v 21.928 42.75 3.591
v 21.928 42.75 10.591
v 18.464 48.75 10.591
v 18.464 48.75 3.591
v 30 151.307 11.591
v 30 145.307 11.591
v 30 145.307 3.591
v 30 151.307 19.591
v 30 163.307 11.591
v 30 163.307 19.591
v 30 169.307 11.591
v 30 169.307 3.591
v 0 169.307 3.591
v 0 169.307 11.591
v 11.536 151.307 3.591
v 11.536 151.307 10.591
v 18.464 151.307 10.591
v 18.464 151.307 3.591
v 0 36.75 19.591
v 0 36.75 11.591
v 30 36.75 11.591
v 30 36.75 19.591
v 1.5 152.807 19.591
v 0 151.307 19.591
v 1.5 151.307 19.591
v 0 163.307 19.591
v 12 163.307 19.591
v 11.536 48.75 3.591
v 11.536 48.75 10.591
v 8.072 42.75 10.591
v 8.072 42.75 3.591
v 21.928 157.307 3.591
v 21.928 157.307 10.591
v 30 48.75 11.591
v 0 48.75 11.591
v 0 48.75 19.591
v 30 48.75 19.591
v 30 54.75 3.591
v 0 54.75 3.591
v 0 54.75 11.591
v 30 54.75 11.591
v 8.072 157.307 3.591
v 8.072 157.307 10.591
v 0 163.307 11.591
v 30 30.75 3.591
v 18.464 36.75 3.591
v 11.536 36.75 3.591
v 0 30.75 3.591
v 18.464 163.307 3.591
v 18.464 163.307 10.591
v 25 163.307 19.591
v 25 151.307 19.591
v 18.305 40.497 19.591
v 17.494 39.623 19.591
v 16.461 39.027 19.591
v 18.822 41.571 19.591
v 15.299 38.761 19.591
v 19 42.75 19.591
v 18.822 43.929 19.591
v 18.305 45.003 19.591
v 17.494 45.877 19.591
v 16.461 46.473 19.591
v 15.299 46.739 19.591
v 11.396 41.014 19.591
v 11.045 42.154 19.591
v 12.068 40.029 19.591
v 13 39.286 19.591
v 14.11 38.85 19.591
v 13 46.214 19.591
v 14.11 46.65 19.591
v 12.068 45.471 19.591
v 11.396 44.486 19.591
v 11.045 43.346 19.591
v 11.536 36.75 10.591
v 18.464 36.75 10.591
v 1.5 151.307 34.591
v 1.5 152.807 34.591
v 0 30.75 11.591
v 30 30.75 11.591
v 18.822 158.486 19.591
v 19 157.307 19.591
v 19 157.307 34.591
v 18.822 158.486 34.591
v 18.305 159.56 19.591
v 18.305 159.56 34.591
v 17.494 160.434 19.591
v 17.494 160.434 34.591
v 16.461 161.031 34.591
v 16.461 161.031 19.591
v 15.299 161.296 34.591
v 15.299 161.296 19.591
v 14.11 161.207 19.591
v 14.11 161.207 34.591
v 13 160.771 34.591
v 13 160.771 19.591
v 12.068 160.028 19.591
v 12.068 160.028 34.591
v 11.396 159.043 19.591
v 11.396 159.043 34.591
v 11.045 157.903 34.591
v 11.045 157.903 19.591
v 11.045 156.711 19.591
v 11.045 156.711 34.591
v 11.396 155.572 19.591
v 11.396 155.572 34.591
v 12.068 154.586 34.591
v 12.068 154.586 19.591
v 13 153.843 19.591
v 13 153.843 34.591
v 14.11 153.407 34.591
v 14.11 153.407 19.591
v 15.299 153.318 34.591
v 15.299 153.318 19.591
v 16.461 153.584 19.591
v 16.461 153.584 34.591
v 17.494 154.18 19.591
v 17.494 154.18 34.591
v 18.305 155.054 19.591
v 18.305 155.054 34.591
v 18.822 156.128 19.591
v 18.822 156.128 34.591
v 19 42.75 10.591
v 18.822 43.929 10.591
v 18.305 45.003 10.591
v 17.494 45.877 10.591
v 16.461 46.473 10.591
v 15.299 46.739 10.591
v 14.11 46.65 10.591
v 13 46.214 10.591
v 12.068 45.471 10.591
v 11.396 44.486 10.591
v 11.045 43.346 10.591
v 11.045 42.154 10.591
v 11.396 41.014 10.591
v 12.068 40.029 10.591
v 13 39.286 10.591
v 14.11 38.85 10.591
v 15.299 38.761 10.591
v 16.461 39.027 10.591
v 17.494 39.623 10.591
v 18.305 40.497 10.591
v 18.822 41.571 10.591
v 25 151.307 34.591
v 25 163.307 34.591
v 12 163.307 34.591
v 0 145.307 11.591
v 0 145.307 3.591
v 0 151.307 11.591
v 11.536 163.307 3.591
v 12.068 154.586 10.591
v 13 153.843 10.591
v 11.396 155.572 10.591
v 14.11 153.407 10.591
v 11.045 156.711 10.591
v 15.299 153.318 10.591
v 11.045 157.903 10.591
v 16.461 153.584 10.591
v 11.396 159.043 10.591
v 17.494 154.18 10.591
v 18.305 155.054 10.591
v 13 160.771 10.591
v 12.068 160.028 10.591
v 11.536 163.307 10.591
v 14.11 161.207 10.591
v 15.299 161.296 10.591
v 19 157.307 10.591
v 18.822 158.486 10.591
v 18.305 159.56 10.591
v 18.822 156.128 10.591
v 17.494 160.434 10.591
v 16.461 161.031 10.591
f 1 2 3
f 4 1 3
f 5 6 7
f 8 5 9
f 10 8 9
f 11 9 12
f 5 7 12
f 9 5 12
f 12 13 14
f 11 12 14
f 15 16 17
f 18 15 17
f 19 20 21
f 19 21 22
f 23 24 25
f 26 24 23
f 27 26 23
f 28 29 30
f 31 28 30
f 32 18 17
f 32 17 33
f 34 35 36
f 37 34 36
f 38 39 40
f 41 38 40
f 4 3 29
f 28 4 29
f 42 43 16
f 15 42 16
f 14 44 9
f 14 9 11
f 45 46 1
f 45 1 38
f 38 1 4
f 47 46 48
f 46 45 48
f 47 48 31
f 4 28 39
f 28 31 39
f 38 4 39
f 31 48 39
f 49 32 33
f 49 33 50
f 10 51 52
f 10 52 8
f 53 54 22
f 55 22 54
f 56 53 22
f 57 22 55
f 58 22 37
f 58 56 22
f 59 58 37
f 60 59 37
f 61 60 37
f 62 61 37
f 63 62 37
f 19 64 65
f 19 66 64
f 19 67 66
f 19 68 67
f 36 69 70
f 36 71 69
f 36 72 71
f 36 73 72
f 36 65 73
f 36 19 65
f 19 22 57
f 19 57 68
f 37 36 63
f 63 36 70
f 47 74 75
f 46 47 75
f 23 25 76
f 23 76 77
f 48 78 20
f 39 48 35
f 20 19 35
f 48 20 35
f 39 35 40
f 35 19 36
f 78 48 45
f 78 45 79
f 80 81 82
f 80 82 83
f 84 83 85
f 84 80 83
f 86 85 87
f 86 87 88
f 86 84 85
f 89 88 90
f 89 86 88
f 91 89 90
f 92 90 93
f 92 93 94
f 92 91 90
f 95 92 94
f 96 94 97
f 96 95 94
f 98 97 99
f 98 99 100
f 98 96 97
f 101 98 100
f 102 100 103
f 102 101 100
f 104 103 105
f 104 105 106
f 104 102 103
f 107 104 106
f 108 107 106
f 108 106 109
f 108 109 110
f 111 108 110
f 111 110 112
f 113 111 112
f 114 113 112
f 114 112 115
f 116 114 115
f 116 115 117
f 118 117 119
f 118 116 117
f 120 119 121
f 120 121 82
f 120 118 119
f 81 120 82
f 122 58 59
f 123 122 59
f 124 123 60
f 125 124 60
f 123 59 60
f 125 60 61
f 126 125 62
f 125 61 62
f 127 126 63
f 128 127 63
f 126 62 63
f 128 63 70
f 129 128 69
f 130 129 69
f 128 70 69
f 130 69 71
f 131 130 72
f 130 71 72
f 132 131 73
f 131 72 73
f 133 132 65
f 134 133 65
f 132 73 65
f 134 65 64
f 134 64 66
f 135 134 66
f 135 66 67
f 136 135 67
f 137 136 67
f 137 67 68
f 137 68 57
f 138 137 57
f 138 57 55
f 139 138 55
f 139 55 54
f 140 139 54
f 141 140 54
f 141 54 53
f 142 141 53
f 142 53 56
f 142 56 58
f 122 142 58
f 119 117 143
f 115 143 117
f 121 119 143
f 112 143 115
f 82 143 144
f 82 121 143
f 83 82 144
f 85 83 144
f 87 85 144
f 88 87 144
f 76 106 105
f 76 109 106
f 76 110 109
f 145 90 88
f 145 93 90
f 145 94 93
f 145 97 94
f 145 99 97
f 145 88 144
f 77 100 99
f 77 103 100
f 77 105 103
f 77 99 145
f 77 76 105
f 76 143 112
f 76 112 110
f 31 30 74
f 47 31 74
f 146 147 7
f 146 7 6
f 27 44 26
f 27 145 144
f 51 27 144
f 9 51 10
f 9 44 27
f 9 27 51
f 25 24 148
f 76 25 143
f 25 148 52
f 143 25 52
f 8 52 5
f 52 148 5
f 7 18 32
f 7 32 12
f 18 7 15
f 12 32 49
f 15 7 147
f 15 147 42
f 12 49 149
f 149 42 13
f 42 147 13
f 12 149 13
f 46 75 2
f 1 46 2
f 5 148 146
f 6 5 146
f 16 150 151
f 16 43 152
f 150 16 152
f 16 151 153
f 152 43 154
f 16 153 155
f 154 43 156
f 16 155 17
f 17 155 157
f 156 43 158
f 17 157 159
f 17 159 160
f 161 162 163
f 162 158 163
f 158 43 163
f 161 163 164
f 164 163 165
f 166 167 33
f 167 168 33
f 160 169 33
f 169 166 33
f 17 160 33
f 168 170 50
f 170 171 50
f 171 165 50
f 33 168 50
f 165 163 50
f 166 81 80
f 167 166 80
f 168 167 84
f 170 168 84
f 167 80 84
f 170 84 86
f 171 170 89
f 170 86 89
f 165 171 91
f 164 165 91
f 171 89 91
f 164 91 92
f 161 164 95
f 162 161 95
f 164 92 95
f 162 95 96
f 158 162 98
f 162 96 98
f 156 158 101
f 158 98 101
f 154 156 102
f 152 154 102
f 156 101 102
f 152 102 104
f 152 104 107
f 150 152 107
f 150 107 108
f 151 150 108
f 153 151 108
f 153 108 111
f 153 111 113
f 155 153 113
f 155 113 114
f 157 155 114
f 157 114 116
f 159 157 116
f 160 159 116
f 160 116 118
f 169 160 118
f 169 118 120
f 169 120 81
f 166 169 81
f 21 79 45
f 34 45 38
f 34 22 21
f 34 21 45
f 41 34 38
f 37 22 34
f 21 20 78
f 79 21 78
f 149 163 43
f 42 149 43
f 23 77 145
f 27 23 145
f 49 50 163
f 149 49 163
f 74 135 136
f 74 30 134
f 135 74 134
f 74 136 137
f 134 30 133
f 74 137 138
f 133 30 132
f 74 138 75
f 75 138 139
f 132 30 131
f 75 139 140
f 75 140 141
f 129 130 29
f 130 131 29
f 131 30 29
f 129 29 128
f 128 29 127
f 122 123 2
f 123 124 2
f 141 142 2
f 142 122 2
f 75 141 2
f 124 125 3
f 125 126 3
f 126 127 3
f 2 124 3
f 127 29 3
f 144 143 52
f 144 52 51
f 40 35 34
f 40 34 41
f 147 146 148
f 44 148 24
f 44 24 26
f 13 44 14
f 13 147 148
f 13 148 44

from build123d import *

# Parameters (mm, degrees)
F0_W     = 6
F0_H     = 8
F0_W_2   = 12
F1_DEPTH = 30
F3_START = -9
F2_R     = 4
F3_DEPTH = 8
F4_DEPTH = 40
F5_DEPTH = 15
F6_W     = 5
F6_H     = 12
F7_DEPTH = 15


with BuildPart() as f1:
    # F0 (on Right) → F1 (new body)
    with BuildSketch(Plane.YZ):
        with Locations((33.75, 7.591459943)):
            Rectangle(F0_W, F0_H)
        with Locations((42.75, 7.591459943)):
            Rectangle(F0_W_2, F0_H)
        with Locations((42.75, 15.591459943)):
            Rectangle(F0_W_2, F0_H)
        with Locations((51.75, 7.591459943)):
            Rectangle(F0_W, F0_H)
    extrude(amount=F1_DEPTH)


with BuildPart() as f1b:
    # F0 (on Right) → F1, piece 2 (new body)
    with BuildSketch(Plane.YZ):
        with Locations((157.3070744276, 7.591459943)):
            Rectangle(F0_W_2, F0_H)
        with Locations((148.3070744276, 7.591459943)):
            Rectangle(F0_W, F0_H)
        with Locations((157.3070744276, 15.591459943)):
            Rectangle(F0_W_2, F0_H)
        with Locations((166.3070744276, 7.591459943)):
            Rectangle(F0_W, F0_H)
    extrude(amount=F1_DEPTH)


with BuildPart() as f3_tool:
    # F2 (on face) → F3 (new body)
    with BuildSketch(Plane.XY.offset(19.591459943).offset(F3_START)):
        Polygon((18.4641016151, 48.75), (11.5358983849, 48.75), (8.0717967697, 42.75), (11.5358983849, 36.75), (18.4641016151, 36.75), (21.9282032303, 42.75), align=None)
        with Locations((15, 42.75)):
            Circle(F2_R, mode=Mode.SUBTRACT)
        Polygon((21.9282032303, 157.3070744276), (18.4641016151, 163.3070744276), (11.5358983849, 163.3070744276), (8.0717967697, 157.3070744276), (11.5358983849, 151.3070744276), (18.4641016151, 151.3070744276), align=None)
        with Locations((15, 157.3070744276)):
            Circle(F2_R, mode=Mode.SUBTRACT)
    extrude(amount=-F3_DEPTH)


with BuildPart() as f1_1:
    add(f1.part)

    # F3: cut by f3_tool
    add(f3_tool.part, mode=Mode.SUBTRACT)


with BuildPart() as f1b_1:
    add(f1b.part)

    # F3: cut by f3_tool
    add(f3_tool.part, mode=Mode.SUBTRACT)


with BuildPart() as f4_tool:
    # F2 (on face) → F4 (new body)
    with BuildSketch(Plane.XY.offset(19.591459943)):
        with Locations((15, 42.75)):
            Circle(F2_R)
        with Locations((15, 157.3070744276)):
            Circle(F2_R)
    extrude(amount=-F4_DEPTH)


with BuildPart() as f1_2:
    add(f1_1.part)

    # F4: cut by f4_tool
    add(f4_tool.part, mode=Mode.SUBTRACT)


with BuildPart() as f1b_2:
    add(f1b_1.part)

    # F4: cut by f4_tool
    add(f4_tool.part, mode=Mode.SUBTRACT)

    # F5 (add): a face of the model
    f5_faces = [f1b_2.faces().sort_by_distance(p)[0] for p in [
        (15, 162.9839645392, 19.591459943),
    ]]
    extrude(f5_faces, amount=F5_DEPTH)

    # F6 (on face) → F7 (cut)
    with BuildSketch(Plane.XY.offset(34.591459943)):
        Polygon((0, 163.3070744276), (0, 151.3070744276), (1.5, 152.8070744276), (12, 163.3070744276), align=None)
        with Locations((27.5, 157.3070744276)):
            Rectangle(F6_W, F6_H)
        Polygon((1.5, 152.8070744276), (0, 151.3070744276), (1.5, 151.3070744276), align=None)
    extrude(amount=-F7_DEPTH, mode=Mode.SUBTRACT)


solid = Compound([f1_2.part, f1b_2.part])
